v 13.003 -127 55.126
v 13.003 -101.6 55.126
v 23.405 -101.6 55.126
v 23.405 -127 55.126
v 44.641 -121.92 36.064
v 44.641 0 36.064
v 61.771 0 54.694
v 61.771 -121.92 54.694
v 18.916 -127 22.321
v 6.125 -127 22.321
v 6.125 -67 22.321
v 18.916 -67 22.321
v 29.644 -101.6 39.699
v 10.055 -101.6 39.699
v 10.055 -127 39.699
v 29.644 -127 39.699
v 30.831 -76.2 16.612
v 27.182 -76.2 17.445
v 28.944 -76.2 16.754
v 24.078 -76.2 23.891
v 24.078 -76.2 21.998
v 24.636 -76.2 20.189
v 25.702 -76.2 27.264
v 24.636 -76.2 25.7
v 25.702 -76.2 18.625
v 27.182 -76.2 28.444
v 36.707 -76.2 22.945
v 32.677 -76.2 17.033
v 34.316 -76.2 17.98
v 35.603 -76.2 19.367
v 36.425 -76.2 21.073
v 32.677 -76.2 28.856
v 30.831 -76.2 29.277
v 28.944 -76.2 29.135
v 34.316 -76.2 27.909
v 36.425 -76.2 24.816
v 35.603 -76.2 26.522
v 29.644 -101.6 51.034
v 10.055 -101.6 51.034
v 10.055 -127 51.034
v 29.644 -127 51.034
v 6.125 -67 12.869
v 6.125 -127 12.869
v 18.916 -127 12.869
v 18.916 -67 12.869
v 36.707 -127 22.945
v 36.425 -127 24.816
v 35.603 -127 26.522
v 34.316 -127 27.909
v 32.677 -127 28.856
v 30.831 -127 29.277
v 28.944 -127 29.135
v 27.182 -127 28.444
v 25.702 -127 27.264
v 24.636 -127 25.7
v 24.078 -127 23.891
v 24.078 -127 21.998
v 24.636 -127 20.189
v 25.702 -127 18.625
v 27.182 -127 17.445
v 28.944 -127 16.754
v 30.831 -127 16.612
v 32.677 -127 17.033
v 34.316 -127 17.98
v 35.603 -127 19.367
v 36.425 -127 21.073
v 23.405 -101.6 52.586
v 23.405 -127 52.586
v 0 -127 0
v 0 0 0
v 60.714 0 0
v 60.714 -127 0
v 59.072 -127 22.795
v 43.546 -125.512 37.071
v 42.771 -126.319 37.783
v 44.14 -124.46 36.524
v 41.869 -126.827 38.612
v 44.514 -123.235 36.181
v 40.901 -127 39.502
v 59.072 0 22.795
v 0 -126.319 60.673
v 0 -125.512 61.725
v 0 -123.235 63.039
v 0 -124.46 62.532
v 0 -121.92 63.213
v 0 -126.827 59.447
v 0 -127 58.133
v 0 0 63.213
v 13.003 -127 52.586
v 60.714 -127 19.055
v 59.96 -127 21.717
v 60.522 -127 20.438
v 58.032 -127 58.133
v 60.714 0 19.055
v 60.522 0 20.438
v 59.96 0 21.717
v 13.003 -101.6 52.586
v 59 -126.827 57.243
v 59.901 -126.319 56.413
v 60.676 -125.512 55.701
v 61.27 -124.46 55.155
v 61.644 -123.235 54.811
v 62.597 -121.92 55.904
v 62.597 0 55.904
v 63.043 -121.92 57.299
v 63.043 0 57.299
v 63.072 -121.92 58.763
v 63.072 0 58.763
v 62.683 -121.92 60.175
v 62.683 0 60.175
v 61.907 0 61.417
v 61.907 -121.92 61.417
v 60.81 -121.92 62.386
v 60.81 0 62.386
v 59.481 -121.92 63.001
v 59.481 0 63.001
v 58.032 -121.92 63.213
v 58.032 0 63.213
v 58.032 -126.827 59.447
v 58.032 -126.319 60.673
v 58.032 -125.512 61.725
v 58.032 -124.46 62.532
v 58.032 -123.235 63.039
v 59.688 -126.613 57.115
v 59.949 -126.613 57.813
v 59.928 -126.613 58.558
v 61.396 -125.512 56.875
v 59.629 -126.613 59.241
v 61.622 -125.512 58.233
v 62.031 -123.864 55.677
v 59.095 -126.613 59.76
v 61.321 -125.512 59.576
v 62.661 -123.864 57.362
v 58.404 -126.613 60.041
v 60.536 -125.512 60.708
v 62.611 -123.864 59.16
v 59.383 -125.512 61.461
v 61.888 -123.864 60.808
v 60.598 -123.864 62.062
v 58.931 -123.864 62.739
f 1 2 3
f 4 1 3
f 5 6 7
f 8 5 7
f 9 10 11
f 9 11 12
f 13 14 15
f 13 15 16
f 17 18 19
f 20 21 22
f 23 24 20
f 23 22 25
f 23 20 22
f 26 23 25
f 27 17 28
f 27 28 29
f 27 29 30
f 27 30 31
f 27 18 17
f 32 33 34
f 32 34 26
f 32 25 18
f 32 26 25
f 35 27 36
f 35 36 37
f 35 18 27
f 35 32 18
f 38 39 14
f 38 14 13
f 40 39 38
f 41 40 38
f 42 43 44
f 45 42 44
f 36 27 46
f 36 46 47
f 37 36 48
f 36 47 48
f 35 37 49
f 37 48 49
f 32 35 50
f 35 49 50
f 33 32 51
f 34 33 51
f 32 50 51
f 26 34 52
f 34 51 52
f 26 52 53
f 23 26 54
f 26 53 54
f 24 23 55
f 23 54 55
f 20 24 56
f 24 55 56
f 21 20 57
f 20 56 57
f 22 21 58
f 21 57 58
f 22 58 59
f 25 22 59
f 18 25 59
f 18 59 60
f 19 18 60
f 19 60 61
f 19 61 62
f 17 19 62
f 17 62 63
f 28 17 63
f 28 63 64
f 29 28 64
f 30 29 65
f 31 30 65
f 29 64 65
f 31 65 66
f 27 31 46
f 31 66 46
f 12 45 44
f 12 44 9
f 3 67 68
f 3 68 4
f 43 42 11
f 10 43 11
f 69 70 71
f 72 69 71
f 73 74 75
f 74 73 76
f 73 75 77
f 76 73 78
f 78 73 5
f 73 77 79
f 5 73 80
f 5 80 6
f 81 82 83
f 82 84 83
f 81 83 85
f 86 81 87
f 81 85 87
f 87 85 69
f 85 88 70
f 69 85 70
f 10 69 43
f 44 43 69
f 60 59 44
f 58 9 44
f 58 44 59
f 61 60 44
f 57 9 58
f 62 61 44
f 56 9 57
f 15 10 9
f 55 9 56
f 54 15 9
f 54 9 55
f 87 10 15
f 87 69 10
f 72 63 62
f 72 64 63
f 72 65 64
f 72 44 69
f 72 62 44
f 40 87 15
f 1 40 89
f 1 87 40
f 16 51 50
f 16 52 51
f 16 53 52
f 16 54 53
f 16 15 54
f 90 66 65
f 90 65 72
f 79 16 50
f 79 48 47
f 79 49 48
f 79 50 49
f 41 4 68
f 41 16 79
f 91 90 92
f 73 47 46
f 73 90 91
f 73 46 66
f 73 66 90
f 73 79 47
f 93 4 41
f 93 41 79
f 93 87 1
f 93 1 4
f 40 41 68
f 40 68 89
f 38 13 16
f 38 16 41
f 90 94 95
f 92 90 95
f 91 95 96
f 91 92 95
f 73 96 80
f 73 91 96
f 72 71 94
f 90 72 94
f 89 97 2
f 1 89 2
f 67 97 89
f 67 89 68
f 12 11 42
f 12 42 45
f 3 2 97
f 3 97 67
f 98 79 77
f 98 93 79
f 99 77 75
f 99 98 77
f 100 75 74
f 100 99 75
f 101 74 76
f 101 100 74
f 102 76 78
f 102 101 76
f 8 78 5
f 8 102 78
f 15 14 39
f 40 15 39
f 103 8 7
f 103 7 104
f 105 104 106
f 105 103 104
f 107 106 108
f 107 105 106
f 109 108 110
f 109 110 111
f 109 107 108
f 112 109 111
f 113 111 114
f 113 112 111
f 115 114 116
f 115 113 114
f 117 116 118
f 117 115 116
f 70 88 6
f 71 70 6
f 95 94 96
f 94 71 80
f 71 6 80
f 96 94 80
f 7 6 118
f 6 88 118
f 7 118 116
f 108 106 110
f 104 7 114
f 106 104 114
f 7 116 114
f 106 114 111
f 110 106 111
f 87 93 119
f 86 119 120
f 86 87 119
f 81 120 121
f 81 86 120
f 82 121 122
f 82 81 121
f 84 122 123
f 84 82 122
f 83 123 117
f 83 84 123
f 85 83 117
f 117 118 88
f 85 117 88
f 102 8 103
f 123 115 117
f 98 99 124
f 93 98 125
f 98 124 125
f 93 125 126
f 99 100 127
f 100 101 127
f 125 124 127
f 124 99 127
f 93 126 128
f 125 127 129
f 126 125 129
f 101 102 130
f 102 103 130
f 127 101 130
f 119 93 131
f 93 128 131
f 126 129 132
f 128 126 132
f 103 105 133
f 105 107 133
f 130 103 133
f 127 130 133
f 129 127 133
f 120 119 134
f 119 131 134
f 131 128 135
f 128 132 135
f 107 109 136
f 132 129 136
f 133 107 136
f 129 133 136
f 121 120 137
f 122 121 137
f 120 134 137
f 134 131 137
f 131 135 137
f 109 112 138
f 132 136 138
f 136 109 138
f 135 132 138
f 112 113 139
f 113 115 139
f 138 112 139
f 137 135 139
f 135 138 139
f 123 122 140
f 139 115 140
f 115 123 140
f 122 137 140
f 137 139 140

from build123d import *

# Parameters (mm, degrees)
F1_DEPTH  = 127
F2_R      = 5.08
F3_R      = 6.35
F4_DEPTH  = 50.8
F6_W      = 10.401725
F6_H      = 2.54
F7_DEPTH  = 25.4
F5_W      = 19.589182
F5_H      = 11.334733
F8_DEPTH  = 25.4
F9_R      = 5.08
F10_W     = 12.79125
F10_H     = 9.451311
F11_DEPTH = 60


with BuildPart() as f1:
    # F0 (on Front) → F1 (new body)
    with BuildSketch(Plane.XZ):
        Polygon((0, 63.212529), (0, 0), (60.713694, 0), (60.713694, 21.285245), (44.640973, 36.063522), (69.603488, 63.212529), align=None)
    extrude(amount=F1_DEPTH)

    # F2
    f2_edges = [f1.edges().sort_by_distance(p)[0] for p in [
        (69.603488, -63.5, 63.212529),
        (60.713694, -63.5, 21.285245),
    ]]
    fillet(f2_edges, radius=F2_R)

    # F3 (on face) → F4 (cut)
    with BuildSketch(Plane.XZ.offset(127)):
        with Locations((30.356847, 22.944534)):
            Circle(F3_R)
    extrude(amount=-F4_DEPTH, mode=Mode.SUBTRACT)

    # F6 (on face) → F7 (cut)
    with BuildSketch(Plane.XZ.offset(127)):
        with Locations((18.203875, 53.85644)):
            Rectangle(F6_W, F6_H)
    extrude(amount=-F7_DEPTH, mode=Mode.SUBTRACT)

    # F5 (on face) → F8 (cut)
    with BuildSketch(Plane.XZ.offset(127)):
        with Locations((19.849312, 45.366853)):
            Rectangle(F5_W, F5_H)
    extrude(amount=-F8_DEPTH, mode=Mode.SUBTRACT)

    # F9
    f9_edges = [f1.edges().sort_by_distance(p)[0] for p in [
        (29.01582, -127, 63.212529),
    ]]
    fillet(f9_edges, radius=F9_R)

    # F10 (on face) → F11 (cut)
    with BuildSketch(Plane.XZ.offset(127)):
        with Locations((12.520159, 17.595014)):
            Rectangle(F10_W, F10_H)
    extrude(amount=-F11_DEPTH, mode=Mode.SUBTRACT)


solid = f1.part
